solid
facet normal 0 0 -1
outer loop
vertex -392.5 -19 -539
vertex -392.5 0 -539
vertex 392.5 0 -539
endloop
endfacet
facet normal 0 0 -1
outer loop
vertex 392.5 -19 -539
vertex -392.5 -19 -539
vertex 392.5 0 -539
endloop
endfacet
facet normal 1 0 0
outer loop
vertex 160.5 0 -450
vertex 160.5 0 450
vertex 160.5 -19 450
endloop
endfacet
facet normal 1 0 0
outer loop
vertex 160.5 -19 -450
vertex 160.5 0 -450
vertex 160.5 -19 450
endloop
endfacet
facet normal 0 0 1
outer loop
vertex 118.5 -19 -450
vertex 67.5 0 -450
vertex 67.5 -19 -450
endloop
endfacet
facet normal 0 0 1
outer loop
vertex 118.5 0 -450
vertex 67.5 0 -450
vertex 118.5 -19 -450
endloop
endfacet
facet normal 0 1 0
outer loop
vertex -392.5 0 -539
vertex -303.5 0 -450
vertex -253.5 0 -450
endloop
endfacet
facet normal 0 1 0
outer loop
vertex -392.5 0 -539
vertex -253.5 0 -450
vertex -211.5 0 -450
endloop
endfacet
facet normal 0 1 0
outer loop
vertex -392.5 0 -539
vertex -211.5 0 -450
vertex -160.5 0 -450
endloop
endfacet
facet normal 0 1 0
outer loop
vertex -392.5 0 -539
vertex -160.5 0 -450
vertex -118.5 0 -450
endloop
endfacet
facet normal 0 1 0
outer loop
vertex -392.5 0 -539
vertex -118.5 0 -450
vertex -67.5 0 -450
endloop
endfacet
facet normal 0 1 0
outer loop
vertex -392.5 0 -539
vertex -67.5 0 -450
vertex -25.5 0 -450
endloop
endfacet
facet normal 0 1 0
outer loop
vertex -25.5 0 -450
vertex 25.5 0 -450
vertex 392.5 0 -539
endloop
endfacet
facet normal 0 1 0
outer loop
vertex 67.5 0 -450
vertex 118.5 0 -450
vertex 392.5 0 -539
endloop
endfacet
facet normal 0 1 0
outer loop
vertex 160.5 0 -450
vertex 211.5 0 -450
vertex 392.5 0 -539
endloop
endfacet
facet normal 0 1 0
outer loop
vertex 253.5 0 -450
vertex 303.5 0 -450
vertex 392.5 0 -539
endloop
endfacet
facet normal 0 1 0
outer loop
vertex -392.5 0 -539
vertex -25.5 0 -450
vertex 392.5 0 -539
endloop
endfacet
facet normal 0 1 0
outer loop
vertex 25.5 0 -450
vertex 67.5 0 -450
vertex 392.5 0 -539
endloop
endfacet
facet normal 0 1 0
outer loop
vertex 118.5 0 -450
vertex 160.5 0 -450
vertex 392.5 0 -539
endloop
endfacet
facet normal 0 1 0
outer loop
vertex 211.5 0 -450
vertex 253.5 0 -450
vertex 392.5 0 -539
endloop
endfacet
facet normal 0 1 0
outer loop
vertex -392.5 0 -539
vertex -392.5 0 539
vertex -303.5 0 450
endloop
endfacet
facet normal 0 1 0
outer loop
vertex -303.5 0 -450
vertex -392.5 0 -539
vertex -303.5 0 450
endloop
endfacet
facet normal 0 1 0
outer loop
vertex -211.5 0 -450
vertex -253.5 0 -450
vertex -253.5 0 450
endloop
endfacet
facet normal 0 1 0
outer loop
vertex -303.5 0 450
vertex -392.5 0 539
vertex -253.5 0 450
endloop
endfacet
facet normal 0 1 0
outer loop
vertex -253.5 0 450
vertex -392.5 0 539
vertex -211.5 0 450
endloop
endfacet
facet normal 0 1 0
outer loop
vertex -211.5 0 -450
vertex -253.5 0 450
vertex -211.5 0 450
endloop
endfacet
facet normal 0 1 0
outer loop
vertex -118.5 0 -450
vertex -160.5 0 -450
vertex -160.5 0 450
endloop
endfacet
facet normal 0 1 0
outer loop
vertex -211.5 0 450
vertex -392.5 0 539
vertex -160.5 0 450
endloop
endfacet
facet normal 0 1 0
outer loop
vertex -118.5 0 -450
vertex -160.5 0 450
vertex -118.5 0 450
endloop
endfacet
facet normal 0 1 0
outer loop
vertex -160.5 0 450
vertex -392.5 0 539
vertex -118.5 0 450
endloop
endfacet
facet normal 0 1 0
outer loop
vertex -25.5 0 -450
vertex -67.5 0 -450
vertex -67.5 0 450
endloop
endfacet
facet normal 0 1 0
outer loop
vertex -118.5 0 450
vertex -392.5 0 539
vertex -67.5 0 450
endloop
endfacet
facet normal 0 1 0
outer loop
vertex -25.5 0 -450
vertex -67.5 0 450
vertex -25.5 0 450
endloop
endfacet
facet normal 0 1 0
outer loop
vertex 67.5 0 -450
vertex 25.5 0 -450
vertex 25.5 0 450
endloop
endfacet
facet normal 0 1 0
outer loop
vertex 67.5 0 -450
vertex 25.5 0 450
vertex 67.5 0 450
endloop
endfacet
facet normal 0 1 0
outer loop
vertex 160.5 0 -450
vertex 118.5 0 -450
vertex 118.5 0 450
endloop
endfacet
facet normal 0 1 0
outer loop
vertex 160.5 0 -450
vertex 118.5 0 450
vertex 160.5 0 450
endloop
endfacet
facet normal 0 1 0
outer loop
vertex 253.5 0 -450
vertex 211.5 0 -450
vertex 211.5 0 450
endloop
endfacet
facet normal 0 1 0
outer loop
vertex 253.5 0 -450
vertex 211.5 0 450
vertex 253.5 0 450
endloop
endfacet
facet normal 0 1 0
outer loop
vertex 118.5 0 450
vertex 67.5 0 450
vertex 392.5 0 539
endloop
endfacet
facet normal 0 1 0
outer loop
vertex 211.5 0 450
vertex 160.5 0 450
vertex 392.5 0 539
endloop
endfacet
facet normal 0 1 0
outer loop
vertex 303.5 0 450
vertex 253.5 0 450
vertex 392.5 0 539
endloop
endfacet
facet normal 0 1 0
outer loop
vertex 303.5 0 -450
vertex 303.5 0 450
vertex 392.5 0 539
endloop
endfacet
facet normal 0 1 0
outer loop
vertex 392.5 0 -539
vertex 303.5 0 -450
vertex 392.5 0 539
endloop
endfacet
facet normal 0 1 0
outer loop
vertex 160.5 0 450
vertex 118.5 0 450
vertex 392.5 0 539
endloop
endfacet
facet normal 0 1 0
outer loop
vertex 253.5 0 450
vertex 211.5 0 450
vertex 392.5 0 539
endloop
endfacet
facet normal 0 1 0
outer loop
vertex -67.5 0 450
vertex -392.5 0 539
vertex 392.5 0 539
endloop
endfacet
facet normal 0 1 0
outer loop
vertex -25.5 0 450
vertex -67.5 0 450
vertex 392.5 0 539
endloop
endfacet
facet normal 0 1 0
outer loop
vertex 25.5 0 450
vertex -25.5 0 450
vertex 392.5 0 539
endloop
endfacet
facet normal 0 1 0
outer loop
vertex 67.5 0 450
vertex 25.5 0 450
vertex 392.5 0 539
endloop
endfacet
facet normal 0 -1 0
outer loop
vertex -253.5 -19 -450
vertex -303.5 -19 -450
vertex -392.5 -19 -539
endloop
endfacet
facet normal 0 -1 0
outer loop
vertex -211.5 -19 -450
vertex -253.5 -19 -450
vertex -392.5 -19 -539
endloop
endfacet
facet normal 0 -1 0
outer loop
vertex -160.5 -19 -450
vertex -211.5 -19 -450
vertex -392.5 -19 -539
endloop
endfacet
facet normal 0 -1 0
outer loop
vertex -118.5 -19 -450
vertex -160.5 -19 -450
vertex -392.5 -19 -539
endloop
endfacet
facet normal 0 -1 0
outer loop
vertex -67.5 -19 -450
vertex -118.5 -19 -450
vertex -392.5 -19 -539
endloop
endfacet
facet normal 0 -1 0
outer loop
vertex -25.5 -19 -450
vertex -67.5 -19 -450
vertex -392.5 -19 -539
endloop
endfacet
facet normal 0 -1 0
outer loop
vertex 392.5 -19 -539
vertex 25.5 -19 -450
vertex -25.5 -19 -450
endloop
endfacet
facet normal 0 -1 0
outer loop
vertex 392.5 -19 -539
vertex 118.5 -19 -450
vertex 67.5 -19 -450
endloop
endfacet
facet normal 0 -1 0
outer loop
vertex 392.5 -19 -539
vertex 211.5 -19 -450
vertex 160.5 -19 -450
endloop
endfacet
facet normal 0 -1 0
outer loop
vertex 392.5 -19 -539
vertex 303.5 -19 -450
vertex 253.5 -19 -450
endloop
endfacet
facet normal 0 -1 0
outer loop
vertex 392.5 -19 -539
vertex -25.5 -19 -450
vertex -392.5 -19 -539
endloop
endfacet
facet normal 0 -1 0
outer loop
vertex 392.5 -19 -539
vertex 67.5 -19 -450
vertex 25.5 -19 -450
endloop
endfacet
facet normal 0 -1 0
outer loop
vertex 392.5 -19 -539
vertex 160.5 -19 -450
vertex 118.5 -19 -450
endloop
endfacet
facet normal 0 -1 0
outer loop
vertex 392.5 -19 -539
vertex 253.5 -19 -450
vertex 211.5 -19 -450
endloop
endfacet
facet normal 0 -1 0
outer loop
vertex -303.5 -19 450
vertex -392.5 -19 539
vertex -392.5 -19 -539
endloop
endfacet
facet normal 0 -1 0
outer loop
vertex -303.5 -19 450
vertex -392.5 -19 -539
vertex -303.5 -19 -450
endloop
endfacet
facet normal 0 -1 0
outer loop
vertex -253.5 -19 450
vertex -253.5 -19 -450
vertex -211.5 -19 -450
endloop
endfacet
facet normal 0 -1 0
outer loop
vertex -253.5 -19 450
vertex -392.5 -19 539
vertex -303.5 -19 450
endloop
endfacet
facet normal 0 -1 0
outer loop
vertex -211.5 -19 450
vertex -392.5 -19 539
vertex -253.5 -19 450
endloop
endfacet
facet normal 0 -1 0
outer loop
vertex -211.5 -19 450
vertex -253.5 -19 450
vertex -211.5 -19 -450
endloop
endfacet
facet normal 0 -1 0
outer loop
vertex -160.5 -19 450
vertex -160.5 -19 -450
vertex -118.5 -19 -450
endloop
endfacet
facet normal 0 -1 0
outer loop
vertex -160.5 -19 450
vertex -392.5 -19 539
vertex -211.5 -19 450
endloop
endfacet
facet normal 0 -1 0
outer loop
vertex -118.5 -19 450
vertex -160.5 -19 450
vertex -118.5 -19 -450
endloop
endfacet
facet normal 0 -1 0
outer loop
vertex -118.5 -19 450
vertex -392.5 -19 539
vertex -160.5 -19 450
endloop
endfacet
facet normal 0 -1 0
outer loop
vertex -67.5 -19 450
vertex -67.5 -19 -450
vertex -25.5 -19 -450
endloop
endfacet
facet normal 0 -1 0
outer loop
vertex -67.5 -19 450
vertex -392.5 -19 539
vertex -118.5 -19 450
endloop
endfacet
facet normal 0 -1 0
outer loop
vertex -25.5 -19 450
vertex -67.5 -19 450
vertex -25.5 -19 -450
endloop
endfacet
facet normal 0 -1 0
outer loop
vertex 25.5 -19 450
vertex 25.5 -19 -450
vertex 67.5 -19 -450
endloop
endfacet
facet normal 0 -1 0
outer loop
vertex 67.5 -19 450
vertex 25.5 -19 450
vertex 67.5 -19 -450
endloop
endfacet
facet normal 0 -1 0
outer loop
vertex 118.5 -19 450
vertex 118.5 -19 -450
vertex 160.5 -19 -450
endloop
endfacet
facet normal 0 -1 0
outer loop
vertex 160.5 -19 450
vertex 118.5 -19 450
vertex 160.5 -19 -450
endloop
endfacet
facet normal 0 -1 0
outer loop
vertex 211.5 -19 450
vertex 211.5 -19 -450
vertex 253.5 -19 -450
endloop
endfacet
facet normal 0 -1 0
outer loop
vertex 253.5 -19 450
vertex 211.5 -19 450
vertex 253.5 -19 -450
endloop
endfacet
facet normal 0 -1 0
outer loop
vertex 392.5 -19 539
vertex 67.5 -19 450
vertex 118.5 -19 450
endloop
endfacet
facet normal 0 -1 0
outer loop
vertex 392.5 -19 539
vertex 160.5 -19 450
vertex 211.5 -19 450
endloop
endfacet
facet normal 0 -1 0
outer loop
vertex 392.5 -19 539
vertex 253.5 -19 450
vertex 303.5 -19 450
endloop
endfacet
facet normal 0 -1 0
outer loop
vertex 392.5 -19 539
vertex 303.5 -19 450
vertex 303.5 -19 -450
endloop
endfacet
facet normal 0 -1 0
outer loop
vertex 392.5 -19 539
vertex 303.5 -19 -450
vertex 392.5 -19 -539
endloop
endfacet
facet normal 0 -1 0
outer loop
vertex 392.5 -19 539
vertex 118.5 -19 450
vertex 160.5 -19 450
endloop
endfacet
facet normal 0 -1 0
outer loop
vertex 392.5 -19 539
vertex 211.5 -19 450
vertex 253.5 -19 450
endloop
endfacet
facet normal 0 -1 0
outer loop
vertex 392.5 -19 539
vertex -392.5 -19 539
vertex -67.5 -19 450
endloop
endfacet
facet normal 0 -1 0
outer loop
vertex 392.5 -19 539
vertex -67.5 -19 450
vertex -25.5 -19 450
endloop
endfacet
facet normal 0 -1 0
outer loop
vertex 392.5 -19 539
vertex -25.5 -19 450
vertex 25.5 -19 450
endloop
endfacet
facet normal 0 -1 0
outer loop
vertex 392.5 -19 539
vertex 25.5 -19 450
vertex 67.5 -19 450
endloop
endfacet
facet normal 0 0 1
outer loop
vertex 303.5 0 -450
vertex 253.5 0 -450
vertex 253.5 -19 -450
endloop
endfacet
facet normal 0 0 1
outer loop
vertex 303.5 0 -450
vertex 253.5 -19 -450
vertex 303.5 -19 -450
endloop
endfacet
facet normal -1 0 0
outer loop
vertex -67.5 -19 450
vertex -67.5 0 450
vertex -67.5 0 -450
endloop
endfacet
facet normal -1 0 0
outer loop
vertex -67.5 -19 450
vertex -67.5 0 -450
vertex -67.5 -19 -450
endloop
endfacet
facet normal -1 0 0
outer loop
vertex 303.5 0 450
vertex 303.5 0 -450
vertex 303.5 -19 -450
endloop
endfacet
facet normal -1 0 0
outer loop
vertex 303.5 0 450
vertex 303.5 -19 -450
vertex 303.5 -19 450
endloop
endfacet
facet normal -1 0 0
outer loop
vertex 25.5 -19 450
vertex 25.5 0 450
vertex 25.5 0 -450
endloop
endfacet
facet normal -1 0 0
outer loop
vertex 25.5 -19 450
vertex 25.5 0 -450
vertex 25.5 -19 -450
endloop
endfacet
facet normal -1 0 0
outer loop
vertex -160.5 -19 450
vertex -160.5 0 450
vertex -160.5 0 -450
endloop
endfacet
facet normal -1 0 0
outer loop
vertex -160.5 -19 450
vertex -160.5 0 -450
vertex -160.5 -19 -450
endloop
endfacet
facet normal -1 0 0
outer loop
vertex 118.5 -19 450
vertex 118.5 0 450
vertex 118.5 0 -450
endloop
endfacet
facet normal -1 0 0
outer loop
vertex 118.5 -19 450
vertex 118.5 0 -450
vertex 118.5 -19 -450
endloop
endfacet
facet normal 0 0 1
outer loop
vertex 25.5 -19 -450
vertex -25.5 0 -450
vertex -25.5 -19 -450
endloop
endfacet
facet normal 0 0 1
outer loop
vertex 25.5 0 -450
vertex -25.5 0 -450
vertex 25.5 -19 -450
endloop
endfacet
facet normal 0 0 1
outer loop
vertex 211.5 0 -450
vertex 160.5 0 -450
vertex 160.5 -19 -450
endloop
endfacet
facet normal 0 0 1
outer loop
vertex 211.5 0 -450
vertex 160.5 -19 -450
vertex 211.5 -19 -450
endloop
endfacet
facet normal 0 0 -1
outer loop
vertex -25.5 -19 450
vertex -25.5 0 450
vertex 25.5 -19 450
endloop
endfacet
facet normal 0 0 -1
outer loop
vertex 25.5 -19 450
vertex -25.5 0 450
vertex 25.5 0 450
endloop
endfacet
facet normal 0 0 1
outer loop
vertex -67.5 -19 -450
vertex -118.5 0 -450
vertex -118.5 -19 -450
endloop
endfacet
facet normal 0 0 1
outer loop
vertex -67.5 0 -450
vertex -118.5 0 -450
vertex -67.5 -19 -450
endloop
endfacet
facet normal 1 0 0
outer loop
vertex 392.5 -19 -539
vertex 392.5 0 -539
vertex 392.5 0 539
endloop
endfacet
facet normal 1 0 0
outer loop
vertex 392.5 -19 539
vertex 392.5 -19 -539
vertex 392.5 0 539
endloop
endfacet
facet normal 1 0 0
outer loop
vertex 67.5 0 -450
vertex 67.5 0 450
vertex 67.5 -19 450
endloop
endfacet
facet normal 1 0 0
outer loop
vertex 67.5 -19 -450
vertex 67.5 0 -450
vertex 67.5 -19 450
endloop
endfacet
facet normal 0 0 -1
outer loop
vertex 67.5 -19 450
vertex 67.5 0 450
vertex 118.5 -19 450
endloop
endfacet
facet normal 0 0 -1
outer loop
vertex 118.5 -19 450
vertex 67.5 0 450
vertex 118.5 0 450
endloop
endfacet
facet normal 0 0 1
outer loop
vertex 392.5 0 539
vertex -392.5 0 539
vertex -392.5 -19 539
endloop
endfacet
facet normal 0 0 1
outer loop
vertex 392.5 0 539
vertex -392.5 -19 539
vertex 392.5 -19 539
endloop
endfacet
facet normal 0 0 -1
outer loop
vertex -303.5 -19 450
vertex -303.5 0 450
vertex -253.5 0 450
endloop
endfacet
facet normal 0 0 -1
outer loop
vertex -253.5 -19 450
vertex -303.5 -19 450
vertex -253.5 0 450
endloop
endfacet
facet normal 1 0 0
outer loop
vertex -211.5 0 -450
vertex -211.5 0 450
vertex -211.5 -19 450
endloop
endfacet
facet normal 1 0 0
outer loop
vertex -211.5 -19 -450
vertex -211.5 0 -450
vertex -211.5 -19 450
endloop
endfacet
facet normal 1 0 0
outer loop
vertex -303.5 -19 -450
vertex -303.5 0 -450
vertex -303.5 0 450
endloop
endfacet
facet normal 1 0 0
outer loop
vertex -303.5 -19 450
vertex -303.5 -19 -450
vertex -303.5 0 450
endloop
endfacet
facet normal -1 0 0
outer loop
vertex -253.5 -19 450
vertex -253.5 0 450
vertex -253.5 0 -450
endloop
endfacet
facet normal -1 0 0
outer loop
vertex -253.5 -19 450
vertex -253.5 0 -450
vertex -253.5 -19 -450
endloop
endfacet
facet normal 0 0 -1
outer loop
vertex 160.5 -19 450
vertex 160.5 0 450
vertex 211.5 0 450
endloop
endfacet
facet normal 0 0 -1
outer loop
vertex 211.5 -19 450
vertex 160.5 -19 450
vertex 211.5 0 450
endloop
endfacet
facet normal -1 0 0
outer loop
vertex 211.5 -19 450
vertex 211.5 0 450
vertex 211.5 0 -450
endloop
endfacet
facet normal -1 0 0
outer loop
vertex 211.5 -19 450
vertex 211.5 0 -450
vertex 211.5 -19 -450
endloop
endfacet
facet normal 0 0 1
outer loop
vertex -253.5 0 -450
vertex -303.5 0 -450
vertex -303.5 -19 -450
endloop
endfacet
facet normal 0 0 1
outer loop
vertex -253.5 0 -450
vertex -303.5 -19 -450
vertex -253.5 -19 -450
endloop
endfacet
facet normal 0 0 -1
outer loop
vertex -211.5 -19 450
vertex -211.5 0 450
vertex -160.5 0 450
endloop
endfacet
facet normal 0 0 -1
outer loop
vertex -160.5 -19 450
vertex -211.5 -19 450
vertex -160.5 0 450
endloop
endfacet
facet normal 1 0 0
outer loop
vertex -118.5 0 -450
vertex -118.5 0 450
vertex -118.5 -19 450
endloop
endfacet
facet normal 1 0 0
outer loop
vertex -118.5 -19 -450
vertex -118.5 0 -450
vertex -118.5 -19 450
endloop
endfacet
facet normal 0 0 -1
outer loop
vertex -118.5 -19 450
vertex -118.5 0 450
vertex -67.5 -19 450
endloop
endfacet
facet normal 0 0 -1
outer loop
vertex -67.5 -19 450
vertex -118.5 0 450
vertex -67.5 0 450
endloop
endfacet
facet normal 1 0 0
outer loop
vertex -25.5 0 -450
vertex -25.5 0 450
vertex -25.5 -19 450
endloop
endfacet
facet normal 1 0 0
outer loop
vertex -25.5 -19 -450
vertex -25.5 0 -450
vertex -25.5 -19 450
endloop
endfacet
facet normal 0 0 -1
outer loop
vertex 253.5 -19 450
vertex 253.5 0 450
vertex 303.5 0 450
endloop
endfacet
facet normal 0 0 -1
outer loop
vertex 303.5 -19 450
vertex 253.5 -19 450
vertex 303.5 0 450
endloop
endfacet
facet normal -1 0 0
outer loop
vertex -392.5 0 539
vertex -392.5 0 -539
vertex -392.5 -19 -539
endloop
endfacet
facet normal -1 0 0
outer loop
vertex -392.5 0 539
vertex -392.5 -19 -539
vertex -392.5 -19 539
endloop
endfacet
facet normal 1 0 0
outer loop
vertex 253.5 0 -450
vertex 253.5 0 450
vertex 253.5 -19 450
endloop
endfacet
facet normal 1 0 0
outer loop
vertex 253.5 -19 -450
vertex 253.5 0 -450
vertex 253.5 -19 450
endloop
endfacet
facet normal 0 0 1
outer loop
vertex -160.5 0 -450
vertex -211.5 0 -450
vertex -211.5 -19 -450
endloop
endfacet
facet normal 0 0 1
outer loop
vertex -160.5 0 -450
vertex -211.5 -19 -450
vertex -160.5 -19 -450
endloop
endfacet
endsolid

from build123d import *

# Parameters (mm, degrees)
F0_W     = 785
F0_H     = 1078
F0_W_2   = 607
F0_H_2   = 900
F1_DEPTH = 19
F2_W     = 42
F2_H     = 19
F3_DEPTH = 900


with BuildPart() as f1:
    # F0 (on Front) → F1 (new body)
    with BuildSketch(Plane.XZ):
        Rectangle(F0_W, F0_H)
        Rectangle(F0_W_2, F0_H_2, mode=Mode.SUBTRACT)
    extrude(amount=F1_DEPTH)

    # F2 (on face) → F3 (join, through all)
    with BuildSketch(Plane(origin=(0, 0, 450), x_dir=(1, 0, 0), z_dir=(0, 0, -1))):
        with Locations((-232.5, 9.5)):
            Rectangle(F2_W, F2_H)
        with Locations((-139.5, 9.5)):
            Rectangle(F2_W, F2_H)
        with Locations((-46.5, 9.5)):
            Rectangle(F2_W, F2_H)
        with Locations((46.5, 9.5)):
            Rectangle(F2_W, F2_H)
        with Locations((139.5, 9.5)):
            Rectangle(F2_W, F2_H)
        with Locations((232.5, 9.5)):
            Rectangle(F2_W, F2_H)
    extrude(amount=F3_DEPTH)


solid = f1.part
